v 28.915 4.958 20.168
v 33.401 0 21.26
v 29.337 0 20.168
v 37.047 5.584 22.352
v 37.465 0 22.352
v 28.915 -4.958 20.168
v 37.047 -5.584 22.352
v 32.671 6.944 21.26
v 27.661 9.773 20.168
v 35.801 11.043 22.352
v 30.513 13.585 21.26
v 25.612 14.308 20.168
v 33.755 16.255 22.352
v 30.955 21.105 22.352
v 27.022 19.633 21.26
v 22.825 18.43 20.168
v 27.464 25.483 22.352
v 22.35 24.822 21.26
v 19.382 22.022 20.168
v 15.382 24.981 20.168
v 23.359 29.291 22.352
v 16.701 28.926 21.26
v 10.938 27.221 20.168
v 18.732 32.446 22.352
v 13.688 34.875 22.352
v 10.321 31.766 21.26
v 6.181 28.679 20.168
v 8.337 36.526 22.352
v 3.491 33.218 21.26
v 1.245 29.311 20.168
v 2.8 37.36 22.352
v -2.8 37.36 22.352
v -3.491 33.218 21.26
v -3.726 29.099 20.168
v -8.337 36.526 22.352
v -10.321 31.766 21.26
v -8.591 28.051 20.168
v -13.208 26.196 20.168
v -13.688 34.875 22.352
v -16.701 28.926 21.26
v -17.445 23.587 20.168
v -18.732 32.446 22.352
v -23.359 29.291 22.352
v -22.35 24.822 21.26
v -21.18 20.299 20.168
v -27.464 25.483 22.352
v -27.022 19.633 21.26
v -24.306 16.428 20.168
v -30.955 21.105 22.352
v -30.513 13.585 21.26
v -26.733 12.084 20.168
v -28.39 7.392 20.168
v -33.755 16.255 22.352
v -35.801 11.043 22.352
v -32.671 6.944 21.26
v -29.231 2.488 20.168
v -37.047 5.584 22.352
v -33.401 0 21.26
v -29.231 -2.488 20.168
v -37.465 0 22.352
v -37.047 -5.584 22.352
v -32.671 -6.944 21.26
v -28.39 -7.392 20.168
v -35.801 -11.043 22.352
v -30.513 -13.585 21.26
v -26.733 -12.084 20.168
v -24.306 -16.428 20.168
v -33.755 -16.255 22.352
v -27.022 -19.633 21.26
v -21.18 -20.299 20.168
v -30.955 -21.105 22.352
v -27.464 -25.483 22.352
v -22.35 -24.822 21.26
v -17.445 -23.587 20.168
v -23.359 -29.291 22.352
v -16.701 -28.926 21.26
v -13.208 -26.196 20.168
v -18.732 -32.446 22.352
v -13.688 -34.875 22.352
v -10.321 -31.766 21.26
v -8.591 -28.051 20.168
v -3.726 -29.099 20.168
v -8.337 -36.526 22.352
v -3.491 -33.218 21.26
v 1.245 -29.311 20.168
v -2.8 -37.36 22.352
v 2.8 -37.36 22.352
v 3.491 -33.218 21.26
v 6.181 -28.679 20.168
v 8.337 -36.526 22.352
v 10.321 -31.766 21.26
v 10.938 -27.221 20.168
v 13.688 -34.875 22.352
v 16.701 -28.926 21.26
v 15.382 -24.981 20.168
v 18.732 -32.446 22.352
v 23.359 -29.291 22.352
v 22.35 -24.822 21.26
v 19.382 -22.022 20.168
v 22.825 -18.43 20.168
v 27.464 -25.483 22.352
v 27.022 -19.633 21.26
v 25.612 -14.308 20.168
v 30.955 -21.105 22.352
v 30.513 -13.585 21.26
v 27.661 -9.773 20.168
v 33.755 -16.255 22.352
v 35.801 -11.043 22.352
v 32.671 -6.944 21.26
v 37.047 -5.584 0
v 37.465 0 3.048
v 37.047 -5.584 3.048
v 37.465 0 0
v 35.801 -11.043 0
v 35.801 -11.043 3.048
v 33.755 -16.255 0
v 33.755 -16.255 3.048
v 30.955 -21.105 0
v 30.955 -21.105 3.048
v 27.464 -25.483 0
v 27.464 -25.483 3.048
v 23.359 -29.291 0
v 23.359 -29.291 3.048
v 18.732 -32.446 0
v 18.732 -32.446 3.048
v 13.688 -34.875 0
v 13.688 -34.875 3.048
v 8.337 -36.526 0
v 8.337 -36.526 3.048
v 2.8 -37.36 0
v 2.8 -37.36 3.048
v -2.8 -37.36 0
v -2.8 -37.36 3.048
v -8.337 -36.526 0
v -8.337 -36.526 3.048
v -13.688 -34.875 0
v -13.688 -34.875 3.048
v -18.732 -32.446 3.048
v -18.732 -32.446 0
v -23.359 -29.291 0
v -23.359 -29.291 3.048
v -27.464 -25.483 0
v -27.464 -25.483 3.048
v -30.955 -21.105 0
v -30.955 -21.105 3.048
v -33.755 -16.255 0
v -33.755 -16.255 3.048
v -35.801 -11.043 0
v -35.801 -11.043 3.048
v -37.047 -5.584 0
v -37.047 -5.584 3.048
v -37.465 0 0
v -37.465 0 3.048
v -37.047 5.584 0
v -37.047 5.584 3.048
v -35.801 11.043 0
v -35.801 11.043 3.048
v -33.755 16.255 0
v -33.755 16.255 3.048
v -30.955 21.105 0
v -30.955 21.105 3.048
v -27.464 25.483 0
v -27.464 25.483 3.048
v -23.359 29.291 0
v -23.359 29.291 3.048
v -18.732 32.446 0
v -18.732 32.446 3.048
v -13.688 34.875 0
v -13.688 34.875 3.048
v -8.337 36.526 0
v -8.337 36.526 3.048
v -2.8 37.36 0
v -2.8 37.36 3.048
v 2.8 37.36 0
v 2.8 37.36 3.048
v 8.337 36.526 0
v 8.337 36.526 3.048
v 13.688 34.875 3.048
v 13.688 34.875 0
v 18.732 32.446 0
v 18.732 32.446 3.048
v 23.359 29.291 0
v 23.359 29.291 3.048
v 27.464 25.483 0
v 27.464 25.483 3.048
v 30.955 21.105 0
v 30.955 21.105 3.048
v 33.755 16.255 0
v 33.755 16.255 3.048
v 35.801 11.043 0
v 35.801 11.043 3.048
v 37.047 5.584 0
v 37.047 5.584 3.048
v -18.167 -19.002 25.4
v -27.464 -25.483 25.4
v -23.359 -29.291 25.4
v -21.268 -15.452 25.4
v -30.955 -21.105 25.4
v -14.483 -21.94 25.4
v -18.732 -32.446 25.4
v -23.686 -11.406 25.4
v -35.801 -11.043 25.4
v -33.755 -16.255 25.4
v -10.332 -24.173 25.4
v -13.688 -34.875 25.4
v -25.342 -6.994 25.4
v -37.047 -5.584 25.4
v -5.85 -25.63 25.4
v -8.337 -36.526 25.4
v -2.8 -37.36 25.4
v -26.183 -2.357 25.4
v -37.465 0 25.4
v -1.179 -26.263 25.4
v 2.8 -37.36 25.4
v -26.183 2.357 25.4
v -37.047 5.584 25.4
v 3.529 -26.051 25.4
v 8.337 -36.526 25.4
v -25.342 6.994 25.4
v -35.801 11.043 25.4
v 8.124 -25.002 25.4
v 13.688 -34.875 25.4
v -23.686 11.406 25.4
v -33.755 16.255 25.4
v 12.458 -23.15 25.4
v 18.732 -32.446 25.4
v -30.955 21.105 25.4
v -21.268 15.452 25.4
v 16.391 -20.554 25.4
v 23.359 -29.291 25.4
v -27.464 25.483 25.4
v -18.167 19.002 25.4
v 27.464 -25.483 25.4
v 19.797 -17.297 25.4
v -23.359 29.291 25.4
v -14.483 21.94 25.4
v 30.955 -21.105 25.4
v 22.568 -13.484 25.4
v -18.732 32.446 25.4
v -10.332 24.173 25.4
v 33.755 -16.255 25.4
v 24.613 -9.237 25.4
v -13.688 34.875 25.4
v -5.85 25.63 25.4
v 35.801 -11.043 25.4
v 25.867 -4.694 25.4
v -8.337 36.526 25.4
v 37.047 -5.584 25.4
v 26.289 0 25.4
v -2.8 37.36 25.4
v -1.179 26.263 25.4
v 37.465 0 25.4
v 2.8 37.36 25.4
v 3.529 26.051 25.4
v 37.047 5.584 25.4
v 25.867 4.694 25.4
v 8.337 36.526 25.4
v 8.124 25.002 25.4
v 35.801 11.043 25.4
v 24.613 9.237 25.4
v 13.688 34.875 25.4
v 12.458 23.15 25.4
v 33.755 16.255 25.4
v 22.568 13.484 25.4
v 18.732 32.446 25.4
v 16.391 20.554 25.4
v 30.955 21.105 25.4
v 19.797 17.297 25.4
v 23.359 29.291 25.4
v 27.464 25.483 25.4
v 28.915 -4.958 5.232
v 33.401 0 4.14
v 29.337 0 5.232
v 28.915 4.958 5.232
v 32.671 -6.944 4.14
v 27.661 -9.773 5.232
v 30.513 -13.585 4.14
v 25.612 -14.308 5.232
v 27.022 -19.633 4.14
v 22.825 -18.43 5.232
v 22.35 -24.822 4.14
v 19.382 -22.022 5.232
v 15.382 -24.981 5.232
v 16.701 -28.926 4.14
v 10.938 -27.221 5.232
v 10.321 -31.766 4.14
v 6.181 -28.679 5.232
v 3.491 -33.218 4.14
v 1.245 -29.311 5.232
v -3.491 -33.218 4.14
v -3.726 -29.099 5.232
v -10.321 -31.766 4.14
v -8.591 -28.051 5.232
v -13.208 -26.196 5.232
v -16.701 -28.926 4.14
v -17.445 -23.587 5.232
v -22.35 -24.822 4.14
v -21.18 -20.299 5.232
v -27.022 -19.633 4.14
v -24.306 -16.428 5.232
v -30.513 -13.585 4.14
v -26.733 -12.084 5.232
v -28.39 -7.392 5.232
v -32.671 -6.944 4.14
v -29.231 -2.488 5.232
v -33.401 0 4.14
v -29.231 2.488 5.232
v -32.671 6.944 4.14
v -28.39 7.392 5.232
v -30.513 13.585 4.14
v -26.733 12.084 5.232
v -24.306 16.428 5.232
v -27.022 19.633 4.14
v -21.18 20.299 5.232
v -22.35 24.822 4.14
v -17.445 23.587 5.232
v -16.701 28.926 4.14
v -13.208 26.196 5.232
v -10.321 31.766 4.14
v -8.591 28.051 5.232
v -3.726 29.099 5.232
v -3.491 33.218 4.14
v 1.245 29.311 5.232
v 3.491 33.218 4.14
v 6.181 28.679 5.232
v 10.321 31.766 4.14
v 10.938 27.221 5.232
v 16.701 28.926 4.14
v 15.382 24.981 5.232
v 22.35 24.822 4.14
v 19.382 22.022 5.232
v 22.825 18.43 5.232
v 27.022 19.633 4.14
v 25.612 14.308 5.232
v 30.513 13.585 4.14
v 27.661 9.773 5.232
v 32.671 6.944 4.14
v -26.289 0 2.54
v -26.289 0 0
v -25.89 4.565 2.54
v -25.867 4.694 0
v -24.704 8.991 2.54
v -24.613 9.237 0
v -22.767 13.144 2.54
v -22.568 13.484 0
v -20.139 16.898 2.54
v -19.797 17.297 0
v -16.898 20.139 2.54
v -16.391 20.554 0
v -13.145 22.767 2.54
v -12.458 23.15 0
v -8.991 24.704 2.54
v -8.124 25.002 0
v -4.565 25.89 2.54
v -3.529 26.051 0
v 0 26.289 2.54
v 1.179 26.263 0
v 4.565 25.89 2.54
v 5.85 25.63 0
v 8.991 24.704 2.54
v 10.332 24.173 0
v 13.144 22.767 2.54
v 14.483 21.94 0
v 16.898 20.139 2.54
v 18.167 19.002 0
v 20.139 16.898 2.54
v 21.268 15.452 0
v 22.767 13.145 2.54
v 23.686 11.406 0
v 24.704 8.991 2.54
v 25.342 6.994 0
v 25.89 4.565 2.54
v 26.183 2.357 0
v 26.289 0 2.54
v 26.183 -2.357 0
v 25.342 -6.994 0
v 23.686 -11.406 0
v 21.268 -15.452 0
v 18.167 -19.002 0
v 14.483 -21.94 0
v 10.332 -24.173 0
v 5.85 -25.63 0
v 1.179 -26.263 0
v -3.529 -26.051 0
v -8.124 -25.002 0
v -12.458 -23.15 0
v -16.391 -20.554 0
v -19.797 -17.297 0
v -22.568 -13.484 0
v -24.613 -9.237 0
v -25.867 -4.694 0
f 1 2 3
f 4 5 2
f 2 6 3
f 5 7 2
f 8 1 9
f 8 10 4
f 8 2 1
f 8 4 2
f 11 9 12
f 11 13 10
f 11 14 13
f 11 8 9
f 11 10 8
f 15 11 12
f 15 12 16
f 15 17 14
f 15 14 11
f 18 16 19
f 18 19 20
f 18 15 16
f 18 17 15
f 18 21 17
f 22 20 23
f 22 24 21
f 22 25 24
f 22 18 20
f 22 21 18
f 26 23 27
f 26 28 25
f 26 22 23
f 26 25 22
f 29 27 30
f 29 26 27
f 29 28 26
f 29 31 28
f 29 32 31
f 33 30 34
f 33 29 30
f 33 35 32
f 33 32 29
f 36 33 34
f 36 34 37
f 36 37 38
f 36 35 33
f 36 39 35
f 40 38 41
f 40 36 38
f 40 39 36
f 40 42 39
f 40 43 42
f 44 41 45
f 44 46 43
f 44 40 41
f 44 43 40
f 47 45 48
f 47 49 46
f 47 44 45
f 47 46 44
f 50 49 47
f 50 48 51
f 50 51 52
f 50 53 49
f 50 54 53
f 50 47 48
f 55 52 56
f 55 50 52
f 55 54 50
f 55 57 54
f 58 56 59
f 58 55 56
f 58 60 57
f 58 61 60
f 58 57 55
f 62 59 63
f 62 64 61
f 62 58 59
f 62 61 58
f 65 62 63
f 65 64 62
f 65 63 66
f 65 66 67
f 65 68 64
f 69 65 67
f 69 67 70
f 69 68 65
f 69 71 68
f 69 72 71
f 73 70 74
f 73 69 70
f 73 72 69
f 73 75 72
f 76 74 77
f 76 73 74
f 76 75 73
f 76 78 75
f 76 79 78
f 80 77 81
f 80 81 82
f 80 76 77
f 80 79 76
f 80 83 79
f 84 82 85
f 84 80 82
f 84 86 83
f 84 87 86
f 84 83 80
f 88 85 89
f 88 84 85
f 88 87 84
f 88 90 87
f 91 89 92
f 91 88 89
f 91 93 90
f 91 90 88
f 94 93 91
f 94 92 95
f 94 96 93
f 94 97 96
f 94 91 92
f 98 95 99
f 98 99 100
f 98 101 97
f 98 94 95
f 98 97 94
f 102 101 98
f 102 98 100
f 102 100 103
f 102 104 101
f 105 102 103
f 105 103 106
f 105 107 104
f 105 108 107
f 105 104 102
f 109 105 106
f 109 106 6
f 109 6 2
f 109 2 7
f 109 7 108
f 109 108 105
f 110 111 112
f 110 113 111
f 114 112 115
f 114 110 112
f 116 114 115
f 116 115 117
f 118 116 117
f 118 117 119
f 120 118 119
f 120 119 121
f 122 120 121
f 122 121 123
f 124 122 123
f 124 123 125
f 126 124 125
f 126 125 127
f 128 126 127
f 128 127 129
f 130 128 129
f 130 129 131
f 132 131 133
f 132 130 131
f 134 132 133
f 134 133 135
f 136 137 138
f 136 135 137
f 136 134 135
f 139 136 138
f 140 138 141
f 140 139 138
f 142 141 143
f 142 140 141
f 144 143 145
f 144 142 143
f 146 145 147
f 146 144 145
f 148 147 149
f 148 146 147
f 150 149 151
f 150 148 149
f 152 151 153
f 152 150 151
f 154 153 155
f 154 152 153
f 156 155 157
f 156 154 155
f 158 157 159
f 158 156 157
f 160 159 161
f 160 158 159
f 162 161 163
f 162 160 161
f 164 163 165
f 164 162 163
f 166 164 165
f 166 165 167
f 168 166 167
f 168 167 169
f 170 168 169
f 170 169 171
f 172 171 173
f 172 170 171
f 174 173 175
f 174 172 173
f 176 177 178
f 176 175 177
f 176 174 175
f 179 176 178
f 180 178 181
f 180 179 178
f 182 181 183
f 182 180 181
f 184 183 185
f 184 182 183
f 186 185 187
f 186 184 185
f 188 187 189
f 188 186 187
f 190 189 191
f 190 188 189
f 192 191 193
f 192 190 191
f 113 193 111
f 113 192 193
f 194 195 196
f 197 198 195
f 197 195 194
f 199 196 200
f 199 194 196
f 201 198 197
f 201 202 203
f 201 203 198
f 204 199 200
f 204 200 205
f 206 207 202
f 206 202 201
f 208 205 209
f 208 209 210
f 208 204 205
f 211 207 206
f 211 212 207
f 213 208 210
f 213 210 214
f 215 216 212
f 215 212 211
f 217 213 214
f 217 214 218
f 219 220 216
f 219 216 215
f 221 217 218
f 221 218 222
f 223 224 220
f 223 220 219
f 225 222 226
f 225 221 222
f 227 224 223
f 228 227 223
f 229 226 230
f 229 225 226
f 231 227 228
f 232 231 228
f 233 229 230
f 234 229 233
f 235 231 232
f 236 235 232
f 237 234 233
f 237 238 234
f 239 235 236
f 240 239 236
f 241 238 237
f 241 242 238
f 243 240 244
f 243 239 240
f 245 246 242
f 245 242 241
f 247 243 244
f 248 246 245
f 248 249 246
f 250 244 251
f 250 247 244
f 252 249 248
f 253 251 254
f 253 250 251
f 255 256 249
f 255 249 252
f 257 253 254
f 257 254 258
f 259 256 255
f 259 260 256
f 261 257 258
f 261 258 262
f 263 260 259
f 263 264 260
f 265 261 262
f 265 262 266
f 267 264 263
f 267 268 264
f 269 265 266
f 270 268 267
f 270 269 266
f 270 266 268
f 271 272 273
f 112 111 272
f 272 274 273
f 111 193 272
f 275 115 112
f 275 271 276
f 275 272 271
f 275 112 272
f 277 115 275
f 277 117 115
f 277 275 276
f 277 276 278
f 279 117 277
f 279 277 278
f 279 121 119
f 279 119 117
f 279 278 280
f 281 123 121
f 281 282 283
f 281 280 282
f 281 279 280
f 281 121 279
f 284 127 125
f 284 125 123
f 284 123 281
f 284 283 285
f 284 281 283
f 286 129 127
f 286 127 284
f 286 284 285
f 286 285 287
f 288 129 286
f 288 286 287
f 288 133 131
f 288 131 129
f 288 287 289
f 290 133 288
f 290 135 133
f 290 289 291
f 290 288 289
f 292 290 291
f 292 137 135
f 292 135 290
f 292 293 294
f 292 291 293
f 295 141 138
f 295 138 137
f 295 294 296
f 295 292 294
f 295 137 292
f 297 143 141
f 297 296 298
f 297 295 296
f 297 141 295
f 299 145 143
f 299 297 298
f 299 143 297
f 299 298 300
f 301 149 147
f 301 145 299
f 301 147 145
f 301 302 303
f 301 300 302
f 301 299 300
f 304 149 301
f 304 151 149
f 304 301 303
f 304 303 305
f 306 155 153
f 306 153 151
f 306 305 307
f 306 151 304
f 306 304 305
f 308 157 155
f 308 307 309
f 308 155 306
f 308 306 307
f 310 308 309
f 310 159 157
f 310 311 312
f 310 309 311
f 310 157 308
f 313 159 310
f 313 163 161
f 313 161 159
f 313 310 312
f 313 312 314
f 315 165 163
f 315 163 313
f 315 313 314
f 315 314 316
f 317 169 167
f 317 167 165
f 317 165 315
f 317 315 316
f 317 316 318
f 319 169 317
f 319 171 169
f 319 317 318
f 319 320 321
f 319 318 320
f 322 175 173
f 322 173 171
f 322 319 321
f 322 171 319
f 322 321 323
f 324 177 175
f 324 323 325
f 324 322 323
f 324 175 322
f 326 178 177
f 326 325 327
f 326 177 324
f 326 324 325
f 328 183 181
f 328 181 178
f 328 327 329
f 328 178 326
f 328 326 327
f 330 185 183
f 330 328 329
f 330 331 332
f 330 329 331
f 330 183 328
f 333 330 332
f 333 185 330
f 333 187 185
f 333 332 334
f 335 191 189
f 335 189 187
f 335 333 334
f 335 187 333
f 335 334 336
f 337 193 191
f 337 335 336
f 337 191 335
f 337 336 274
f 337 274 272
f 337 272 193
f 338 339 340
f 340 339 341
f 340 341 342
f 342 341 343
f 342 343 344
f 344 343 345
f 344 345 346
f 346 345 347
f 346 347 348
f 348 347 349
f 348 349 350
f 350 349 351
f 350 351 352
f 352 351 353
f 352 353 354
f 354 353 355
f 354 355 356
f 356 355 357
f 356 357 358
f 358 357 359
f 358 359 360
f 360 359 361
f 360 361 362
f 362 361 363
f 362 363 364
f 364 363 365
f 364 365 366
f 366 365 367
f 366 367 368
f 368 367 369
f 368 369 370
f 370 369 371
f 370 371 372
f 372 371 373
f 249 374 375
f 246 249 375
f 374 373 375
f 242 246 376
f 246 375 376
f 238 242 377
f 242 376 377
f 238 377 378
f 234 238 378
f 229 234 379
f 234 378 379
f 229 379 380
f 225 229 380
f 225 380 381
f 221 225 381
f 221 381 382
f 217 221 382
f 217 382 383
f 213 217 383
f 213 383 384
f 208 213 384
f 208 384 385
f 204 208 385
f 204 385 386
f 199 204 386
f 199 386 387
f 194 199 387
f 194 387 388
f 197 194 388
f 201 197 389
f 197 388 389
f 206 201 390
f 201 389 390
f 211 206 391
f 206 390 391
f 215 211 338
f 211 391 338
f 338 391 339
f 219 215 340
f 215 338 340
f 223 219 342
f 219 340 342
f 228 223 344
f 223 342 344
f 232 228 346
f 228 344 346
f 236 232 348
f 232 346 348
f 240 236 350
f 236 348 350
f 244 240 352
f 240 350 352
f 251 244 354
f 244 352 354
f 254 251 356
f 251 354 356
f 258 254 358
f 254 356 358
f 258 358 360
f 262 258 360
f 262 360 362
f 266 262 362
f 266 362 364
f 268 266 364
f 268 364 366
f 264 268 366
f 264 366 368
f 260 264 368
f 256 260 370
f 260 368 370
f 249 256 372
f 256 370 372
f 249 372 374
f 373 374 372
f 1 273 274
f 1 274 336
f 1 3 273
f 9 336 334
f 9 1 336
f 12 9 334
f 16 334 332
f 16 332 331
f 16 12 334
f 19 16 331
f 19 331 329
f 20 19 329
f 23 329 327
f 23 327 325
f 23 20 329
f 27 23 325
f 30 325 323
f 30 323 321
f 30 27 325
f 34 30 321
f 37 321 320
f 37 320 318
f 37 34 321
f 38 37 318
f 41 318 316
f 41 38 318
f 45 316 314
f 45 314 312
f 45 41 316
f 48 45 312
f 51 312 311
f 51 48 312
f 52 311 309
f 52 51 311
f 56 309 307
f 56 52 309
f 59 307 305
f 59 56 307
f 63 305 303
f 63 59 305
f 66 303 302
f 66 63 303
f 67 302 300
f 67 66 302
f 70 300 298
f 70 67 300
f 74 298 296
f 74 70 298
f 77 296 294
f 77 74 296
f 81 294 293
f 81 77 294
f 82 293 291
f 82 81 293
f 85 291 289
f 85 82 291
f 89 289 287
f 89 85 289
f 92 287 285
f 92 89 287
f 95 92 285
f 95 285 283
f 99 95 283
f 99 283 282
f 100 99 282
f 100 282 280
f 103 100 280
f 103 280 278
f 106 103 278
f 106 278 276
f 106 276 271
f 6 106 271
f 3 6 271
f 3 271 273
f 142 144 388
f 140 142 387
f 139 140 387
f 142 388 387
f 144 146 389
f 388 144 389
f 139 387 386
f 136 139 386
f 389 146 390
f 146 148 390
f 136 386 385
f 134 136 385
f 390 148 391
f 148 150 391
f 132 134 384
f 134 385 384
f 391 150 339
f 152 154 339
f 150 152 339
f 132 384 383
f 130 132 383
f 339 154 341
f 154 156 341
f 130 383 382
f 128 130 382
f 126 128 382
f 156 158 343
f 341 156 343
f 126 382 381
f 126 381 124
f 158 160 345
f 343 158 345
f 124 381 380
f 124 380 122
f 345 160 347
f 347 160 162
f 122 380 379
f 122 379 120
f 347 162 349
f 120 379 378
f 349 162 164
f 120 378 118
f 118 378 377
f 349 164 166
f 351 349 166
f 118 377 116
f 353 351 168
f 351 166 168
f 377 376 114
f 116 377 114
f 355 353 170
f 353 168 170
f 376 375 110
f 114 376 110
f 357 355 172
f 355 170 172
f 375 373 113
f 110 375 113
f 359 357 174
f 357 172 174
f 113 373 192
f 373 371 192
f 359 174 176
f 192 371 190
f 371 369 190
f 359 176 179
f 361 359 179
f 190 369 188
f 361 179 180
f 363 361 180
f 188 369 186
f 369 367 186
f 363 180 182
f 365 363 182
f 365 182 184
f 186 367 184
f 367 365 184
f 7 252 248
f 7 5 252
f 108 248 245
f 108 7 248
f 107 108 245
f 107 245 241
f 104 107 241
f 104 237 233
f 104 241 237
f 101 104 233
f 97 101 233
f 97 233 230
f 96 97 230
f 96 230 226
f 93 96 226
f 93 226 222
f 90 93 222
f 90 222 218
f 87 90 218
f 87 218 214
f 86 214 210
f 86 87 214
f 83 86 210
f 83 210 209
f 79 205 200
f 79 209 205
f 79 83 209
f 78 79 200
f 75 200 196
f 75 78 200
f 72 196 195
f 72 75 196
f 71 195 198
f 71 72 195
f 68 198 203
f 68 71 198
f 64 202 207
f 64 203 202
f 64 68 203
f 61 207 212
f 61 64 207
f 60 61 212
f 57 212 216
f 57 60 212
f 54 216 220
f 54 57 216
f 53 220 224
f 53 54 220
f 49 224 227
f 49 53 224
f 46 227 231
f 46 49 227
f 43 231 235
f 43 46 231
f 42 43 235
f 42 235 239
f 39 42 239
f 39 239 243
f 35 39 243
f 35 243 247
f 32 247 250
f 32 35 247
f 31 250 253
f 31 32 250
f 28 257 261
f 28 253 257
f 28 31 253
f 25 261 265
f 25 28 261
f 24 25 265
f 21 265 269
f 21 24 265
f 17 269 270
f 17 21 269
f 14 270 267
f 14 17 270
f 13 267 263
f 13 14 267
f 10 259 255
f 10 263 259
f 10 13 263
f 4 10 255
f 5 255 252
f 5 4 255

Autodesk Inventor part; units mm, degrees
ref_plane "YZ Plane" through (0, 0, 0) normal (1, 0, 0) x (0, 1, 0)
ref_plane "XZ Plane" through (0, 0, 0) normal (0, 1, 0) x (-1, 0, 0)
sketch "Sketch1" plane through (0, 0, 0) normal (0, 0, 1) x (1, 0, 0)
  circle A0 centre (0, 0) radius 37.465
  dimension "d0" = 74.93
extrude "Extrusion1" add sketch "Sketch1" along normal blind 25.4
sketch "Sketch3" plane through (0, 0, 25.4) normal (0, 0, 1) x (1, 0, 0)
  circle A0 centre (0, 0) radius 26.289
  dimension "d6" = 52.578
extrude "Extrusion3" cut sketch "Sketch3" against normal blind 2.54
sketch "Sketch4" plane through (0, 0, 0) normal (0, 0, -1) x (-1, 0, 0)
  circle A0 centre (0, 0) radius 26.289
  dimension "d9" = 52.578
extrude "Extrusion4" cut sketch "Sketch4" against normal blind 2.54
ref_plane "Work Plane1" through (0, 0, 12.7) normal (0, 0, 1) x (1, 0, 0)
sketch "Sketch5" plane through (0, 0, 12.7) normal (0, 0, 1) x (1, 0, 0)
  circle A0 centre (0, 0) radius 29.337
  circle A1 centre (0, 0) radius 37.465
  dimension "d13" = 58.674
  dimension "d34" = 74.93
extrude "Extrusion5" cut sketch "Sketch5" along normal mid plane 19.304
ref_plane "Work Plane2" through (0, 0, 20.1676) normal (0, 0, 1) x (1, 0, 0)
sketch "Sketch6" plane through (0, 0, 20.1676) normal (0, 0, 1) x (1, 0, 0)
  circle A0 centre (0, 0) radius 29.337
  dimension "d17" = 58.674
loft "Loft1" add profiles "Sketch6" section 1 edges at (-37.465, 0, 22.352)
ref_plane "Work Plane3" through (0, 0, 5.2324) normal (0, 0, 1) x (1, 0, 0)
sketch "Sketch7" plane through (0, 0, 5.2324) normal (0, 0, 1) x (1, 0, 0)
  circle A0 centre (0, 0) radius 29.337
  dimension "d31" = 58.674
loft "Loft3" add profiles "Sketch7" section 1 edges at (-37.465, 0, 3.048)
sketch "Sketch2" plane through (0, 0, 25.4) normal (0, 0, 1) x (1, 0, 0)
  circle A0 centre (0, 0) radius 26.289
  dimension "d3" = 52.578
extrude "Extrusion2" cut sketch "Sketch2" against normal blind 50.8
ref_plane "Work Plane4" through (0, 0, 22.352) normal (0, 0, 1) x (1, 0, 0)
ref_plane "Work Plane5" through (0, 0, 3.048) normal (0, 0, 1) x (1, 0, 0)
properties part number "KF50tube_v2"
